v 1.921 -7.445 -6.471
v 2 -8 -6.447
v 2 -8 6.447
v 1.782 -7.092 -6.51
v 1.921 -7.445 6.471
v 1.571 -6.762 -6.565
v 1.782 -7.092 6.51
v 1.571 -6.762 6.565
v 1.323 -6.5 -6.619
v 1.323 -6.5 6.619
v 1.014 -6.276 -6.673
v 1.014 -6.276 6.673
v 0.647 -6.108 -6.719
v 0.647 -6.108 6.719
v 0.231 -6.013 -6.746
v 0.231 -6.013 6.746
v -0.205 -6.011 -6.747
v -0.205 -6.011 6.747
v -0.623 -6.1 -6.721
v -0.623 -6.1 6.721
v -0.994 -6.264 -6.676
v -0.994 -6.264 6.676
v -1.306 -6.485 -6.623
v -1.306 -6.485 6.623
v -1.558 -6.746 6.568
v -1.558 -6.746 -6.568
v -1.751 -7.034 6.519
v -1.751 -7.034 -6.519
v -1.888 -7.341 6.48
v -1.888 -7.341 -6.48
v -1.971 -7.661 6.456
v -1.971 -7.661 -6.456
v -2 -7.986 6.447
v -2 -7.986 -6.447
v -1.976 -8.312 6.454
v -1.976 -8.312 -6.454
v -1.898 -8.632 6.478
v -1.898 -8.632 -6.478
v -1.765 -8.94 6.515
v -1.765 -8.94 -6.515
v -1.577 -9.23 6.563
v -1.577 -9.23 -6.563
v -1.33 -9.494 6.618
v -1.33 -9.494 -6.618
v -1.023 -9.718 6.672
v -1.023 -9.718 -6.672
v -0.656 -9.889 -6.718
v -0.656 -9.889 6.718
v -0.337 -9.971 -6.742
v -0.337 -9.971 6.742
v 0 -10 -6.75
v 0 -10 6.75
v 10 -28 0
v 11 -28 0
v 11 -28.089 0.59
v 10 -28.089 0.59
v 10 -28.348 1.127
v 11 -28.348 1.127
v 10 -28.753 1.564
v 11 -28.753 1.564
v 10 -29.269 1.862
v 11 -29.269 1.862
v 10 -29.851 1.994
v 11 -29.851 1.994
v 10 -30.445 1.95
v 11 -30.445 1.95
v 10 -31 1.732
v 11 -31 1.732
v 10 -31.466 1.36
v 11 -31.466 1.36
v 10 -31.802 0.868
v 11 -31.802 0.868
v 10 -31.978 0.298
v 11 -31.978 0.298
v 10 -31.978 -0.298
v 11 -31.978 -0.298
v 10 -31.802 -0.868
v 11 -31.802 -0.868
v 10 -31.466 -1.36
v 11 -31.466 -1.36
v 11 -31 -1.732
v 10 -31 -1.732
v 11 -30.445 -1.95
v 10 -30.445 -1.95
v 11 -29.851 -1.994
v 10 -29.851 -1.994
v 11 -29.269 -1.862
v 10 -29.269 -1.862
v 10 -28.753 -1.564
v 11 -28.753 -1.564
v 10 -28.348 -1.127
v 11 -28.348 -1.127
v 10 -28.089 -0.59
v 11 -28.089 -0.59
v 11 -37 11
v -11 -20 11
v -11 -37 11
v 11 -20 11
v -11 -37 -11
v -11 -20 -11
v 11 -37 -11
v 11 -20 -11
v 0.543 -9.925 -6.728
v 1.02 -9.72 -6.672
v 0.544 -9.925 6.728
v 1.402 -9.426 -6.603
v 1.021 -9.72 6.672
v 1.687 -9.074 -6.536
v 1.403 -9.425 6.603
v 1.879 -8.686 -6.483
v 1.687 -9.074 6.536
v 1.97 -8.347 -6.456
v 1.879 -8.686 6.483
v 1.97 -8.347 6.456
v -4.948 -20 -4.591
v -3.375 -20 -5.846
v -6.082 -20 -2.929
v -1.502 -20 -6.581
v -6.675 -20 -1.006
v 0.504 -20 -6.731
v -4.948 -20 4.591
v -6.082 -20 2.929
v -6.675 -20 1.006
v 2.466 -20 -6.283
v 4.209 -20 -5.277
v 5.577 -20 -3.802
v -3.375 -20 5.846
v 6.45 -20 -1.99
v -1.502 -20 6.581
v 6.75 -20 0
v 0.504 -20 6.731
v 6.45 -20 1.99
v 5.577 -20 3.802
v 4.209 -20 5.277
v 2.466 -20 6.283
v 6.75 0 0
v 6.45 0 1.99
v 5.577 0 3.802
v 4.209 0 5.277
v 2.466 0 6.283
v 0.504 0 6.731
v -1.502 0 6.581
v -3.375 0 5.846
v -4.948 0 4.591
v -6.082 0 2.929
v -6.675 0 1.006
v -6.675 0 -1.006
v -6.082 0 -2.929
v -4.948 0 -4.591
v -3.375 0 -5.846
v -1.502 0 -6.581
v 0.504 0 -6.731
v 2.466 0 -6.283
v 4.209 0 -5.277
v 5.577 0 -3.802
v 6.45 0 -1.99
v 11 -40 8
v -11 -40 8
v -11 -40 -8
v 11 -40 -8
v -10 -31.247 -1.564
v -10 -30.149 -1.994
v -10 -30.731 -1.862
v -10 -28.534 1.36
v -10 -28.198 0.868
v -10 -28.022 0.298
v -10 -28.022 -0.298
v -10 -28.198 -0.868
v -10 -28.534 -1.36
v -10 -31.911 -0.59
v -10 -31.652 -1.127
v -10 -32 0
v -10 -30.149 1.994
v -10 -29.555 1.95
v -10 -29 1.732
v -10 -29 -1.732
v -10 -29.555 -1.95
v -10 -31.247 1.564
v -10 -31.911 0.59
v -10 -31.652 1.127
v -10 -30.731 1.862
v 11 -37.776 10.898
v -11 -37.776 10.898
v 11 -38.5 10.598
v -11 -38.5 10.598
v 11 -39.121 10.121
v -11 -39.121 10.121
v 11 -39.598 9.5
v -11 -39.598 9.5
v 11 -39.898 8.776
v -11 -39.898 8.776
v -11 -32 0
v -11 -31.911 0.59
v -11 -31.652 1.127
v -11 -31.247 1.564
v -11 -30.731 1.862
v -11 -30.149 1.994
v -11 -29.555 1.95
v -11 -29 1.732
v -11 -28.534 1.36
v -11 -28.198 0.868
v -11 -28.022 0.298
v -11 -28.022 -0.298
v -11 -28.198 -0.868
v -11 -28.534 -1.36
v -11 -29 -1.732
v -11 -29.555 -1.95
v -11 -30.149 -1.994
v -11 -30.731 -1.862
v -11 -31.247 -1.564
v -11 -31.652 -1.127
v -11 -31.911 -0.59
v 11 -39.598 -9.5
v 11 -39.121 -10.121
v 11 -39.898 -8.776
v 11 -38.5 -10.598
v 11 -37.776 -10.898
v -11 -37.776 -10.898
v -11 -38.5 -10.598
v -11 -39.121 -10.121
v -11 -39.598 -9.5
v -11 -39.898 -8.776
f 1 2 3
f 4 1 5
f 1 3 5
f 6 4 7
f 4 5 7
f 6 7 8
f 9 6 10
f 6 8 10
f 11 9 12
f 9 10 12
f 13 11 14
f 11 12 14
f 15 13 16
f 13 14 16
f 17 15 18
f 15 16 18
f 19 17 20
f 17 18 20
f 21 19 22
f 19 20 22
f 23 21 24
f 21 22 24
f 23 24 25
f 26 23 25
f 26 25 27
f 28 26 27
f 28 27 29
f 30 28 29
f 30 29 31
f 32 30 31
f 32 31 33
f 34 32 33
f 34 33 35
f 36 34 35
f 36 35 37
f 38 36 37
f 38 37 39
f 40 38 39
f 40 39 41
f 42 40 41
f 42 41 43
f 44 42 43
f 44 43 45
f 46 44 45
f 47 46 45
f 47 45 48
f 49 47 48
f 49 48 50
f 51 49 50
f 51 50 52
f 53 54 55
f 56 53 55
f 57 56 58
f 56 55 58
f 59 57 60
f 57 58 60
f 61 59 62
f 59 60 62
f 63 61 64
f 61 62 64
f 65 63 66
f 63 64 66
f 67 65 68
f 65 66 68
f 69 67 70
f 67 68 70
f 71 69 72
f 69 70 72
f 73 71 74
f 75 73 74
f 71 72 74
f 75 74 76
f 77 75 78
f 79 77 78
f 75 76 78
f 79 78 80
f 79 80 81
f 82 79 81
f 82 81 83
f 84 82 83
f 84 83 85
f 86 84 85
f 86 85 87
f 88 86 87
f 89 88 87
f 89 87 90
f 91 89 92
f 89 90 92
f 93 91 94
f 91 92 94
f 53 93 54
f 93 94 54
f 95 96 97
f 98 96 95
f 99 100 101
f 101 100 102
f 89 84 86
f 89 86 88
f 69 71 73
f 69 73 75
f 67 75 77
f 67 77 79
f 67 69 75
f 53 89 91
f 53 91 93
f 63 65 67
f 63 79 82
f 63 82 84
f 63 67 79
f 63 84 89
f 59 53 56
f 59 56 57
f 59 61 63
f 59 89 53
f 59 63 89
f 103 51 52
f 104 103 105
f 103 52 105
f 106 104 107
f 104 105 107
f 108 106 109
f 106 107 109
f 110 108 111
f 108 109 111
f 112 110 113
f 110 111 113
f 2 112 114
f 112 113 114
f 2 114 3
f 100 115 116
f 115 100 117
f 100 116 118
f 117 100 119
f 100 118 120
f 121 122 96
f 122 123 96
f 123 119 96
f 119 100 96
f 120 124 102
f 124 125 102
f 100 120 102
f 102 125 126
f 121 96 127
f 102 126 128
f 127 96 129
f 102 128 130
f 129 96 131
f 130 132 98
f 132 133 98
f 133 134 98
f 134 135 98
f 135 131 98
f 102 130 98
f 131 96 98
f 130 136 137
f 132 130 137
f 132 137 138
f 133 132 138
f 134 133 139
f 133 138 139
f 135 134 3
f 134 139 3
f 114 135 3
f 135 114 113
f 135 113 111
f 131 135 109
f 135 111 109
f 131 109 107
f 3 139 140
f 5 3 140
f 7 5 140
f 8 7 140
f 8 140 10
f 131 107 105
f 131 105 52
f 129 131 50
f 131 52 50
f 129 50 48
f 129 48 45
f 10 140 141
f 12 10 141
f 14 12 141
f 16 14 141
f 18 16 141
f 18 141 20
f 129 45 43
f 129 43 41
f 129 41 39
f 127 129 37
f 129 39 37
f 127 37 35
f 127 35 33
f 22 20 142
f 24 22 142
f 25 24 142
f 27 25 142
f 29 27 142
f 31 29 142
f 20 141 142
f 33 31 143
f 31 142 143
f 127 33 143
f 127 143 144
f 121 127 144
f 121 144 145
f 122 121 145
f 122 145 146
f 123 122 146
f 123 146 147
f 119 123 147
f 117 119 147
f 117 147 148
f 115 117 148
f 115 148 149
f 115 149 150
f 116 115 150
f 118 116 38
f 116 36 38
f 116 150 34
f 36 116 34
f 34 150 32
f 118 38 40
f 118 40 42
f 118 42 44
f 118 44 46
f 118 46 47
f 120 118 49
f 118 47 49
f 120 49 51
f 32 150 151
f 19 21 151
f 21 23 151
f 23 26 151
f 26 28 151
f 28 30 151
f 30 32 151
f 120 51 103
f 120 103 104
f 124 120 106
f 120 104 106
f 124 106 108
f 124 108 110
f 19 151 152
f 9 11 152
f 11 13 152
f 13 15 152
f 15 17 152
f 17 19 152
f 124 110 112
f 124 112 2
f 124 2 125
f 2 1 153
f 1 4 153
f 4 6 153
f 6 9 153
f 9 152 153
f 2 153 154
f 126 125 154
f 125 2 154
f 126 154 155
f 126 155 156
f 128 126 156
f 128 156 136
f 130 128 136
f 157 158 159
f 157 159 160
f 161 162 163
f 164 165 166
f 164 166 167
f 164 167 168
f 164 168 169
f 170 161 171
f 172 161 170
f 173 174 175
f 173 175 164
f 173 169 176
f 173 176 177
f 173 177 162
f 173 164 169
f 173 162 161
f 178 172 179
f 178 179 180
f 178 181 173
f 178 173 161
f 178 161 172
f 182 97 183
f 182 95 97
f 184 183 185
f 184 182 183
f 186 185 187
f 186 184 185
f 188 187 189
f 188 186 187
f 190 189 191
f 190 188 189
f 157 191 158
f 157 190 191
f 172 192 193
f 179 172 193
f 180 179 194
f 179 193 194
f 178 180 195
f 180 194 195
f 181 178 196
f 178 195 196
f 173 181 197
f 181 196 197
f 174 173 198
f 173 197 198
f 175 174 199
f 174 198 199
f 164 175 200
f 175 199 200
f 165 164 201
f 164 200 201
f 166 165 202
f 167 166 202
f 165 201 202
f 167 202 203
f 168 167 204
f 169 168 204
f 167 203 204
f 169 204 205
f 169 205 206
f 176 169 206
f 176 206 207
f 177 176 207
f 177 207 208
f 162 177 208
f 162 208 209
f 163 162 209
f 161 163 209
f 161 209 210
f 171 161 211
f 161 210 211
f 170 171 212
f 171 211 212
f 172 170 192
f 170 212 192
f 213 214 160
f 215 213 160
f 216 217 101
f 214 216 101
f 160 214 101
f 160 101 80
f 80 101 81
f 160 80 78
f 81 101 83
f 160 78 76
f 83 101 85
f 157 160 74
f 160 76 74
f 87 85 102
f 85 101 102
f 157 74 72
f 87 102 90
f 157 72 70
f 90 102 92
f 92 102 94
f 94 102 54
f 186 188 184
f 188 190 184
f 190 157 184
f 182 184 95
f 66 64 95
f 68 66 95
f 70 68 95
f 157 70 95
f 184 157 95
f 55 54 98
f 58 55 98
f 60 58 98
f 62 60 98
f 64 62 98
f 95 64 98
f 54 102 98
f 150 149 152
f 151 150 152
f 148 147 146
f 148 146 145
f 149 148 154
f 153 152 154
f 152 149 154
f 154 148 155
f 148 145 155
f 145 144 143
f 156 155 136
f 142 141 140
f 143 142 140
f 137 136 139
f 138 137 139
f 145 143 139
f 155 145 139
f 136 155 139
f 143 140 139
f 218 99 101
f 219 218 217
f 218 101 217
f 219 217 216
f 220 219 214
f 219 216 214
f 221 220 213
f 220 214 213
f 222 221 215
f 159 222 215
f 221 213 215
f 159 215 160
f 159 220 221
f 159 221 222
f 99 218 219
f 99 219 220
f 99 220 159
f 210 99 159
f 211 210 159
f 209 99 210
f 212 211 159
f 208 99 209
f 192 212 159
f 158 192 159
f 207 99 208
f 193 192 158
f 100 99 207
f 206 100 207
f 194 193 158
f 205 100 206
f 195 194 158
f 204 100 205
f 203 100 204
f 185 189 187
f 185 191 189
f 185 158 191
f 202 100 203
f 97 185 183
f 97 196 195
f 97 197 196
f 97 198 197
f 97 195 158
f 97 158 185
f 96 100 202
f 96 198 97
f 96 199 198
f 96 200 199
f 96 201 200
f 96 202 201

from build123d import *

# Parameters (mm, degrees)
F0_R      = 6.75
F1_DEPTH  = 20
F2_W      = 22
F2_H      = 22
F3_DEPTH  = 20
F4_R      = 3
F6_DEPTH  = 1
F7_R      = 2
F8_DEPTH  = 1
F10_DEPTH = 25


with BuildPart() as f1:
    # F0 (on Front) → F1 (new body)
    with BuildSketch(Plane.XZ):
        Circle(F0_R)
    extrude(amount=F1_DEPTH)

    # F2 (on face) → F3 (join)
    with BuildSketch(Plane.XZ.offset(20)):
        Rectangle(F2_W, F2_H)
    extrude(amount=F3_DEPTH)

    # F4
    f4_edges = [f1.edges().sort_by_distance(p)[0] for p in [
        (0, -40, 11),
        (0, -40, -11),
    ]]
    fillet(f4_edges, radius=F4_R)

    # F5 (on face) → F6 (cut)
    with BuildSketch(Plane.YZ.offset(11)):
        with BuildLine():
            ThreePointArc((-32, 0), (-30, -2), (-28, 0))
            ThreePointArc((-28, 0), (-30, 2), (-32, 0))
        make_face()
    extrude(amount=-F6_DEPTH, mode=Mode.SUBTRACT)

    # F7 (on face) → F8 (cut)
    with BuildSketch(Plane(origin=(-11, 0, 0), x_dir=(0, -1, 0), z_dir=(-1, 0, 0))):
        with Locations((30, 0)):
            Circle(F7_R)
    extrude(amount=-F8_DEPTH, mode=Mode.SUBTRACT)

    # F9 (on face) → F10 (cut)
    with BuildSketch(Plane.XY.offset(11)):
        with BuildLine():
            ThreePointArc((2, -8), (-1.414214, -6.585786), (0, -10))
            ThreePointArc((0, -10), (1.414214, -9.414214), (2, -8))
        make_face()
    extrude(amount=-F10_DEPTH, mode=Mode.SUBTRACT)


solid = f1.part
